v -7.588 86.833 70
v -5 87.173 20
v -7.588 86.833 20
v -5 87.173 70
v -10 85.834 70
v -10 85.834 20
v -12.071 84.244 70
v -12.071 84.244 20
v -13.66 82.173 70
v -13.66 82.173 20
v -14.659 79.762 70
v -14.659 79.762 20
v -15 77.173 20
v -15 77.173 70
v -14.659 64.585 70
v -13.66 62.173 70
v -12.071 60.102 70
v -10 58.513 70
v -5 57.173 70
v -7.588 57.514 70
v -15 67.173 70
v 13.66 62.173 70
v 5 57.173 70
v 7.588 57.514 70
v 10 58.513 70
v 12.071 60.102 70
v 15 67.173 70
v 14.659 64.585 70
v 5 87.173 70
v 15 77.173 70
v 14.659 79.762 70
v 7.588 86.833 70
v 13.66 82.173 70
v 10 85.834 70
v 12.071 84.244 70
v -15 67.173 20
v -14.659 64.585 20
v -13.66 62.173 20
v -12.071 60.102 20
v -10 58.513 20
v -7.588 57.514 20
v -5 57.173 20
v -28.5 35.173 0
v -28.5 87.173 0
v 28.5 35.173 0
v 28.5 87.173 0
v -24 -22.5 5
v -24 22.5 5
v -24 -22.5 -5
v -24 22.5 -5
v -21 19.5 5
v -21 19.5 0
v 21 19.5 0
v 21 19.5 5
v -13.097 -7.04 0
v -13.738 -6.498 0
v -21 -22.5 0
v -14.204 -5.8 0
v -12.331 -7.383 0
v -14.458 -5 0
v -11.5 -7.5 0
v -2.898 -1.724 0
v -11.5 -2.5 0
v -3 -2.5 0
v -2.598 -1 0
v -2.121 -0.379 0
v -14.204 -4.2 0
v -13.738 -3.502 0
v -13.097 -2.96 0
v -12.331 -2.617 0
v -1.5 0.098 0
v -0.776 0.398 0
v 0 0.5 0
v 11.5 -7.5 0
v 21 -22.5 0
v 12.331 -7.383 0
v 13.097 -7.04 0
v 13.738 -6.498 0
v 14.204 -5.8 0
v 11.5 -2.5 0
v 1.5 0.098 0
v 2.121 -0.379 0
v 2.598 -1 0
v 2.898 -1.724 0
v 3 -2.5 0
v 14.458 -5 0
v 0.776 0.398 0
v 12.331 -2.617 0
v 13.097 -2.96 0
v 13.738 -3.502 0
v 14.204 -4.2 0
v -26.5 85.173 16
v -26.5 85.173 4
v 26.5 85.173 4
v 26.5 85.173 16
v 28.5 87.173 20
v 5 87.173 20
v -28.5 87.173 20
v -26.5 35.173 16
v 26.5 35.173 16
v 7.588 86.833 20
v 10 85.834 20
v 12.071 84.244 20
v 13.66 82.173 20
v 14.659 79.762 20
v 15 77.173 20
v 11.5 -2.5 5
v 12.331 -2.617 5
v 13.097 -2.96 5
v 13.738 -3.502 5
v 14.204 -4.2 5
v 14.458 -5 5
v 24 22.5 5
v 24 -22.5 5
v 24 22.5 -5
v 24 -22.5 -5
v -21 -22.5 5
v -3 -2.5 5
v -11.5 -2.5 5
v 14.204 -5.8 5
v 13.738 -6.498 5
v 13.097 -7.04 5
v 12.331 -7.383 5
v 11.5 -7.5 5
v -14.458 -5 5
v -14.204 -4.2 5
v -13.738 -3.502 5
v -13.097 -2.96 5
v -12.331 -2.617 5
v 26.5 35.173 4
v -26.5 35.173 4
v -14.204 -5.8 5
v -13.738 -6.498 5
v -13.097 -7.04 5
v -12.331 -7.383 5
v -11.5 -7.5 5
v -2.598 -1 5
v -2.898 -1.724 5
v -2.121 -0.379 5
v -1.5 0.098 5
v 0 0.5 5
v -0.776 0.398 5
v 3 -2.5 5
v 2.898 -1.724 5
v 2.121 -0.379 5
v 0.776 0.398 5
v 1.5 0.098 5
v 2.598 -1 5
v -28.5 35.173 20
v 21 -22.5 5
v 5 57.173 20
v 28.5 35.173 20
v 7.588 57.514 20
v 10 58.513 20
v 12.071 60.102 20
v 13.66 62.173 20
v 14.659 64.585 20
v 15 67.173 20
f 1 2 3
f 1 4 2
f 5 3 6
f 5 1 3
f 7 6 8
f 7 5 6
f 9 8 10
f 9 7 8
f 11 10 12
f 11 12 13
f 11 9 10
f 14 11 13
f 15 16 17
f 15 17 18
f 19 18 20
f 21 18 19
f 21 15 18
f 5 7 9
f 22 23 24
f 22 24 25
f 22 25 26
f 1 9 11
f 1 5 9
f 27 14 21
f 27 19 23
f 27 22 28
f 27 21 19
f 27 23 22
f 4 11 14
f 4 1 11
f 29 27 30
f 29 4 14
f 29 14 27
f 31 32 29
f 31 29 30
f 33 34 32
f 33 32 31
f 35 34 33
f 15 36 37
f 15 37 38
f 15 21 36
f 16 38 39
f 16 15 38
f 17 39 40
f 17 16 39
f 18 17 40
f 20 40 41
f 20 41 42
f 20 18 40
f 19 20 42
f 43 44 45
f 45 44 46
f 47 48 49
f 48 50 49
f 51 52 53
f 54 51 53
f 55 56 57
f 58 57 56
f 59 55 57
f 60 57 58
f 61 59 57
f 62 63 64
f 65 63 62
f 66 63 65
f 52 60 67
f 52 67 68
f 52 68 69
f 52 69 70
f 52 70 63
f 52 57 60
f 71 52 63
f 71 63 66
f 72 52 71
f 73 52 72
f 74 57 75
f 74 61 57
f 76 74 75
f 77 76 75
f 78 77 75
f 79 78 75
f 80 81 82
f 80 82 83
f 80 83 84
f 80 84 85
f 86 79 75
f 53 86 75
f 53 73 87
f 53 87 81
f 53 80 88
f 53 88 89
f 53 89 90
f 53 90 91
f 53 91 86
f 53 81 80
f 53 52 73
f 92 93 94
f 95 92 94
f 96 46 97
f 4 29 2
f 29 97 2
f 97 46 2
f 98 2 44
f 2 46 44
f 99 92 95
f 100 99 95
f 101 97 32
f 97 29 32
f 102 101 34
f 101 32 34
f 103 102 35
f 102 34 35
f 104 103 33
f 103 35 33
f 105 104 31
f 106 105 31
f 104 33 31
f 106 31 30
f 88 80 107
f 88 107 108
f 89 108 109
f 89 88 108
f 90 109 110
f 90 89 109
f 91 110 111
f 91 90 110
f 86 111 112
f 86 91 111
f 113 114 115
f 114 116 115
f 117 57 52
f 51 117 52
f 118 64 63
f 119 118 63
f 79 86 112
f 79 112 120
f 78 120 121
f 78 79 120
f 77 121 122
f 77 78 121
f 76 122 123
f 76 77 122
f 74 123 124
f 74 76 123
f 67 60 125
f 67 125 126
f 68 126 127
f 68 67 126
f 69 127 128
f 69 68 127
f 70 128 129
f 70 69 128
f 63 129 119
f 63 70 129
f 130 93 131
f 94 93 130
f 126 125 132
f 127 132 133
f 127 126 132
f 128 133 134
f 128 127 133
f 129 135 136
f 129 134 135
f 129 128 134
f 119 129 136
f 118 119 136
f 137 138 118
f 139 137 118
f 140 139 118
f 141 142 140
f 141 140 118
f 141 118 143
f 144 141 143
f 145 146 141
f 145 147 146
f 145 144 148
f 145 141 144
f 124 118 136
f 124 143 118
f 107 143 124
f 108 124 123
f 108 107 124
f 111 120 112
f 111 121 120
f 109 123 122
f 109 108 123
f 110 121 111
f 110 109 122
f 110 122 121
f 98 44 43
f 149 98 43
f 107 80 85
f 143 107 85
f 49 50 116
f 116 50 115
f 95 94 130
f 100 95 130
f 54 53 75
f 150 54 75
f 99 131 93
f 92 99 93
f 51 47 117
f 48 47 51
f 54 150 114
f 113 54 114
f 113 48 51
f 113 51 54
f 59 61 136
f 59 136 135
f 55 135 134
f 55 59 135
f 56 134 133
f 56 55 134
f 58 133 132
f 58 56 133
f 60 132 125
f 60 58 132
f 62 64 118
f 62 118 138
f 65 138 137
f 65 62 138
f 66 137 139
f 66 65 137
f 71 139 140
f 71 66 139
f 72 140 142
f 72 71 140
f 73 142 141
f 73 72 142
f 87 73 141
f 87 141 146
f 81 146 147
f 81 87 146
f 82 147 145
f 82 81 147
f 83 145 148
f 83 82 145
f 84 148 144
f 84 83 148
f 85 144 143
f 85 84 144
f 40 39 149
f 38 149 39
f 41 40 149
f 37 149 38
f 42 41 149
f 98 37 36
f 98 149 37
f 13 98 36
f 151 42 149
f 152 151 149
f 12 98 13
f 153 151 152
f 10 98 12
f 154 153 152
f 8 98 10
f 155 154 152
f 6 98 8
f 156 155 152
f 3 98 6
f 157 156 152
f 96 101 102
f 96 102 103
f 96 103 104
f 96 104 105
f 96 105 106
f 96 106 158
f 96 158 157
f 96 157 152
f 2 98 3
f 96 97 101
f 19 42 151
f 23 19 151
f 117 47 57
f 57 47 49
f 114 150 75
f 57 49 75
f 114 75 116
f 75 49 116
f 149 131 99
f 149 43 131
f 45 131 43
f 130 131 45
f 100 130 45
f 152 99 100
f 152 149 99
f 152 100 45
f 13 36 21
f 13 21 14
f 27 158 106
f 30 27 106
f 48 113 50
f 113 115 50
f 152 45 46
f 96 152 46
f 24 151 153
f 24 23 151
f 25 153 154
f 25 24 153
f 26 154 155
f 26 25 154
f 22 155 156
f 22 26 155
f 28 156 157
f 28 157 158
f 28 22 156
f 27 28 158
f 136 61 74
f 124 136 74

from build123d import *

# Parameters (mm, degrees)
F0_W        = 42
F0_H        = 39
F0_H_2      = 3
F1_DEPTH    = 5
F2_DEPTH    = 5
F3_T1_DEPTH = 12.5
F4_DEPTH    = 20
F0_W_2      = 53
F0_H_3      = 50
F5_DEPTH    = 4
F6_W        = 53
F6_H        = 4
F7_DEPTH    = 50
F8_W        = 30
F8_H        = 30
F9_DEPTH    = 50
F10_R       = 10


# Not quite as in the source:
# - a fillet or chamfer that OpenCascade refuses, or shapes differently, is made with other operations: its cross-section is extruded or revolved along the edge and cut away or added


with BuildPart() as f1:
    # F0 (on Top) → F1 (new body)
    with BuildSketch(Plane.XY):
        Rectangle(F0_W, F0_H)
        Polygon((-14.5, -7.5), (-14.5, -2.5), (-3, -2.5), (-3, 0.5), (3, 0.5), (3, -2.5), (14.5, -2.5), (14.5, -7.5), (3, -7.5), (-3, -7.5), align=None, mode=Mode.SUBTRACT)
        Polygon((-21, 19.5), (21, 19.5), (21, -19.5), (21, -22.5), (24, -22.5), (24, 22.5), (-24, 22.5), (-24, -22.5), (-21, -22.5), (-21, -19.5), align=None)
        with Locations((0, -21)):
            Rectangle(F0_W, F0_H_2)
        Polygon((-3, -2.5), (-14.5, -2.5), (-14.5, -7.5), (-3, -7.5), (3, -7.5), (14.5, -7.5), (14.5, -2.5), (3, -2.5), (3, 0.5), (-3, 0.5), align=None)
    extrude(amount=-F1_DEPTH)

    # F0 (on Top) → F2 (join)
    with BuildSketch(Plane.XY):
        Polygon((-3, -2.5), (-14.5, -2.5), (-14.5, -7.5), (-3, -7.5), (3, -7.5), (14.5, -7.5), (14.5, -2.5), (3, -2.5), (3, 0.5), (-3, 0.5), align=None)
        Polygon((-21, 19.5), (21, 19.5), (21, -19.5), (21, -22.5), (24, -22.5), (24, 22.5), (-24, 22.5), (-24, -22.5), (-21, -22.5), (-21, -19.5), align=None)
    extrude(amount=F2_DEPTH)

    # F3: fillet of radius 3 on 6 edges, made by hand

    # F3_s2 → F3_t1 (cut)
    with BuildSketch(Plane.XY):
        with BuildLine():
            ThreePointArc((-3, -2.5), (-2.1213203436, -0.3786796564), (0, 0.5))
            Line((0, 0.5), (-3, 0.5))
            Line((-3, 0.5), (-3, -2.5))
        make_face()
        with BuildLine():
            ThreePointArc((0, 0.5), (2.1213203436, -0.3786796564), (3, -2.5))
            Line((3, -2.5), (3, 0.5))
            Line((3, 0.5), (0, 0.5))
        make_face()
        with BuildLine():
            ThreePointArc((-14.5, -5.5), (-13.6213203436, -3.3786796564), (-11.5, -2.5))
            Line((-11.5, -2.5), (-14.5, -2.5))
            Line((-14.5, -2.5), (-14.5, -5.5))
        make_face()
        with BuildLine():
            ThreePointArc((-11.5, -7.5), (-13.6213203436, -6.6213203436), (-14.5, -4.5))
            Line((-14.5, -4.5), (-14.5, -7.5))
            Line((-14.5, -7.5), (-11.5, -7.5))
        make_face()
        with BuildLine():
            ThreePointArc((11.5, -2.5), (13.6213203436, -3.3786796564), (14.5, -5.5))
            Line((14.5, -5.5), (14.5, -2.5))
            Line((14.5, -2.5), (11.5, -2.5))
        make_face()
        with BuildLine():
            ThreePointArc((14.5, -4.5), (13.6213203436, -6.6213203436), (11.5, -7.5))
            Line((11.5, -7.5), (14.5, -7.5))
            Line((14.5, -7.5), (14.5, -4.5))
        make_face()
    extrude(amount=F3_T1_DEPTH, mode=Mode.SUBTRACT)


with BuildPart() as f4:
    # F0 (on Top) → F4 (new body)
    with BuildSketch(Plane.XY):
        Polygon((28.5, 35.1734315753), (28.5, 87.1734315753), (-28.5, 87.1734315753), (-28.5, 35.1734315753), (-26.5, 35.1734315753), (-26.5, 85.1734315753), (26.5, 85.1734315753), (26.5, 35.1734315753), align=None)
    extrude(amount=F4_DEPTH)

    # F0 (on Top) → F5 (join)
    with BuildSketch(Plane.XY):
        with Locations((0, 60.1734315753)):
            Rectangle(F0_W_2, F0_H_3)
    extrude(amount=F5_DEPTH)

    # F6 (on face) → F7 (join)
    with BuildSketch(Plane.XZ.offset(-85.1734315753)):
        with Locations((0, 18)):
            Rectangle(F6_W, F6_H)
    extrude(amount=F7_DEPTH)

    # F8 (on face) → F9 (join)
    with BuildSketch(Plane.XY.offset(20)):
        with Locations((0, 72.1734315753)):
            Rectangle(F8_W, F8_H)
    extrude(amount=F9_DEPTH)

    # F10
    f10_edges = [f4.edges().sort_by_distance(p)[0] for p in [
        (15, 57.173432, 45),
        (-15, 57.173432, 45),
        (-15, 87.173432, 45),
        (15, 87.173432, 45),
    ]]
    fillet(f10_edges, radius=F10_R)


solid = Compound([f1.part, f4.part])
